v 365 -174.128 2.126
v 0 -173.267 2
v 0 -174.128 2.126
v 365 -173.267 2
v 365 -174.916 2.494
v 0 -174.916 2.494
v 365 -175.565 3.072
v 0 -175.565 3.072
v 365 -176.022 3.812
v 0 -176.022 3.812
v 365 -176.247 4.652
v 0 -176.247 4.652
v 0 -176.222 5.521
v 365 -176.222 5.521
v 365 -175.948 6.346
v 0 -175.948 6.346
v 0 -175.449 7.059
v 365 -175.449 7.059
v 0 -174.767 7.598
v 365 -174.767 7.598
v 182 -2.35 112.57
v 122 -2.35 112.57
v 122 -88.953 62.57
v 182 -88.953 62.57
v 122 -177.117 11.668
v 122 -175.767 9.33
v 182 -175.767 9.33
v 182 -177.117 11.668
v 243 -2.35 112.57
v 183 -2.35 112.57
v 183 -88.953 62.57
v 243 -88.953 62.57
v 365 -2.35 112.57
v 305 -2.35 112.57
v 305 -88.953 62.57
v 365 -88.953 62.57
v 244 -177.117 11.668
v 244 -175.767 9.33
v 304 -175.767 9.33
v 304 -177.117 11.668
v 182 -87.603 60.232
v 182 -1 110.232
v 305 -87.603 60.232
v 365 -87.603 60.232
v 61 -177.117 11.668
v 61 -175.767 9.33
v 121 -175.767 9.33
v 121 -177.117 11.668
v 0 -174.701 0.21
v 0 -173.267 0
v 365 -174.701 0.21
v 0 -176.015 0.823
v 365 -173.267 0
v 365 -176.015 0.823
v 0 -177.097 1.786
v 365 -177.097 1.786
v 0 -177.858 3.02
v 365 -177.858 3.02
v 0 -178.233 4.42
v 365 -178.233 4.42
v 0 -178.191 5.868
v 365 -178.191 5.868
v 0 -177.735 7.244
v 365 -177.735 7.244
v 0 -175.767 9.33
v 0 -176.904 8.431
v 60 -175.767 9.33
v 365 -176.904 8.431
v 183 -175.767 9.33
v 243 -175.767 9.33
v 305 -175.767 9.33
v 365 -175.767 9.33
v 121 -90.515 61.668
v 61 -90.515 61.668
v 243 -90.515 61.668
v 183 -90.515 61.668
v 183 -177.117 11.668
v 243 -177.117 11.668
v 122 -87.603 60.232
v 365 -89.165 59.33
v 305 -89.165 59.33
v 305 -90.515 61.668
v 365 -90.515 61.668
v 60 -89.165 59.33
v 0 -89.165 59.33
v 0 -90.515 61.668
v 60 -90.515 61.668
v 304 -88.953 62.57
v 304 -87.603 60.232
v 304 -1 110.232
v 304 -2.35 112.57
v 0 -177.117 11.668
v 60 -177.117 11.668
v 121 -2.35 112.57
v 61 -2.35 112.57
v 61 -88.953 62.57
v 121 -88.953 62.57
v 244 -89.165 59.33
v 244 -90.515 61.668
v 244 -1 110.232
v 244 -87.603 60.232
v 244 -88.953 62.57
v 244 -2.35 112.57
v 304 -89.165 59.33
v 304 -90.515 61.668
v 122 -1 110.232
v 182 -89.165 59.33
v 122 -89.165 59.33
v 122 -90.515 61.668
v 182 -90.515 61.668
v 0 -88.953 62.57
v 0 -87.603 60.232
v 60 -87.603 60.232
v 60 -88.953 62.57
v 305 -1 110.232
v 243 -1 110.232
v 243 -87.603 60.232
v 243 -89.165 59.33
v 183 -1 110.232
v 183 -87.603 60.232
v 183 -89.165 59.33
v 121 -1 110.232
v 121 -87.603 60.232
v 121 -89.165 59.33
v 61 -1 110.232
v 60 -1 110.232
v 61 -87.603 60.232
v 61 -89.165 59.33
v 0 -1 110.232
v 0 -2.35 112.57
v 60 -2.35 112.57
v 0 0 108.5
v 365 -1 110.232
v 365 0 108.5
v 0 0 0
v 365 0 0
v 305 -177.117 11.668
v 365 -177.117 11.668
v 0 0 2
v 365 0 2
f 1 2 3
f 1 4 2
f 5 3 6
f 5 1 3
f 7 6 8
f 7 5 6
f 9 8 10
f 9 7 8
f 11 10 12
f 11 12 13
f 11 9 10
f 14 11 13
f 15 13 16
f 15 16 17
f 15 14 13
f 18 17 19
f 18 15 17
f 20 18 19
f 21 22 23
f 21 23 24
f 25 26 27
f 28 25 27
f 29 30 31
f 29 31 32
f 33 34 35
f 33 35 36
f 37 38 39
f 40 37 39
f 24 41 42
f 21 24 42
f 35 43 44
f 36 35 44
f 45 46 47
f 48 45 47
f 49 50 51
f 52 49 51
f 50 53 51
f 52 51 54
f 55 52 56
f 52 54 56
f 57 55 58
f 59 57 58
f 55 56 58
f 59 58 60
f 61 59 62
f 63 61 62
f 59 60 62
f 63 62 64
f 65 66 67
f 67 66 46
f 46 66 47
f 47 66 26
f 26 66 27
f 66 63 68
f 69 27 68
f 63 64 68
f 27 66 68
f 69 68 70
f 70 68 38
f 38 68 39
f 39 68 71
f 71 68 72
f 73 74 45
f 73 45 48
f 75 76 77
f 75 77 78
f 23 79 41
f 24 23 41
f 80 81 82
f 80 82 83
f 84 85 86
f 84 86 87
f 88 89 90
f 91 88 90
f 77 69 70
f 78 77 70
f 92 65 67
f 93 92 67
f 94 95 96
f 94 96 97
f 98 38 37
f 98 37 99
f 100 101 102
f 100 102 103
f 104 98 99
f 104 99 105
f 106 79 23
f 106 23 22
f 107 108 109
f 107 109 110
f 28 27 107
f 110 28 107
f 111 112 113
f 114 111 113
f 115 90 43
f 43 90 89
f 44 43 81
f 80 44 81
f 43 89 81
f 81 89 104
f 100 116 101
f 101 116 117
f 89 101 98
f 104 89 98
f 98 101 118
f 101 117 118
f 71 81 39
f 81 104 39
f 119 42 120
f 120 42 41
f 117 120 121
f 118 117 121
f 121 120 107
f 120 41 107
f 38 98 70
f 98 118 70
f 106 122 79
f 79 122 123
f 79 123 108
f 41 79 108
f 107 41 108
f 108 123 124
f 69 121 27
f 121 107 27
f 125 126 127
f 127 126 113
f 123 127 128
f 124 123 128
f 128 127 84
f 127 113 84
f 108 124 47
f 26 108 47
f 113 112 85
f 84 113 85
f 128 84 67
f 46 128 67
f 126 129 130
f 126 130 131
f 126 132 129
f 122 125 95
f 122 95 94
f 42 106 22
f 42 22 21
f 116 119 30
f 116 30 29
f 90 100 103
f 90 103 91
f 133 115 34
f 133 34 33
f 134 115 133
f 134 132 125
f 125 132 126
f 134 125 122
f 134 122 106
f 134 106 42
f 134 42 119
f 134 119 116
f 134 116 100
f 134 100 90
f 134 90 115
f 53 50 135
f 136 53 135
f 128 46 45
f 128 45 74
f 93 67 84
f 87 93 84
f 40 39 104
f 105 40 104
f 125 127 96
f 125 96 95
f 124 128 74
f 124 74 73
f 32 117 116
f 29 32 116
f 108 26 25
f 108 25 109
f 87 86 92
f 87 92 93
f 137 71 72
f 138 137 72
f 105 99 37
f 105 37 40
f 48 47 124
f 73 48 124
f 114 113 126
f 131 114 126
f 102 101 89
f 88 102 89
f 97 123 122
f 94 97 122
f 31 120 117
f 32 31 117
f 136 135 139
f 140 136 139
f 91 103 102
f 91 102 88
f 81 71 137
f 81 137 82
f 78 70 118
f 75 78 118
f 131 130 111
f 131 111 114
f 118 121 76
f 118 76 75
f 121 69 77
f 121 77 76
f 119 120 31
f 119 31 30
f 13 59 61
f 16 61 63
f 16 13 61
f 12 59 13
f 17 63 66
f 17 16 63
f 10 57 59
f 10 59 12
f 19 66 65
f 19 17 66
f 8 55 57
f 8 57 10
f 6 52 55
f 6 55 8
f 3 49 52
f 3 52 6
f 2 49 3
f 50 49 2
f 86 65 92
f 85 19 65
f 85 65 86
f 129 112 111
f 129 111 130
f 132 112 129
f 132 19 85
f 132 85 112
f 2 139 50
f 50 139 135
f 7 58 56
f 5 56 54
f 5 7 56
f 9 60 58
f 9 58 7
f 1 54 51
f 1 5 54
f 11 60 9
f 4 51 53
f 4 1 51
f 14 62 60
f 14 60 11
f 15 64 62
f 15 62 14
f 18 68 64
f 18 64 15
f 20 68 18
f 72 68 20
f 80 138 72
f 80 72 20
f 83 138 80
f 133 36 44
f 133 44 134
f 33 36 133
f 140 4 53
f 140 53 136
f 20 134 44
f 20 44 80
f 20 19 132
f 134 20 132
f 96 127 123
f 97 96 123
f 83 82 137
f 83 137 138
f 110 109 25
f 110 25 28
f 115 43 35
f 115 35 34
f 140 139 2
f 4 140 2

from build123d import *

# Parameters (mm, degrees)
F1_DEPTH = 365
F2_R     = 3
F3_R     = 5
F4_W     = 60
F4_H     = 100
F5_DEPTH = 2.7


with BuildPart() as f1:
    # F0 (on Right) → F1 (new body)
    with BuildSketch(Plane.YZ):
        Polygon((0, 0), (0, 2), (-184.4634110061, 2), (0, 108.5), (-1, 110.2320508076), (-191.9275126212, 0), align=None)
    extrude(amount=F1_DEPTH)

    # F2
    f2_edges = [f1.edges().sort_by_distance(p)[0] for p in [
        (182.5, -184.463411, 2),
    ]]
    fillet(f2_edges, radius=F2_R)

    # F3
    f3_edges = [f1.edges().sort_by_distance(p)[0] for p in [
        (182.5, -191.927513, 0),
    ]]
    fillet(f3_edges, radius=F3_R)

    # F4 (on face) → F5 (join)
    with BuildSketch(Plane(origin=(0, -47.9818781553, 83.1070508076), x_dir=(1, 0, 0), z_dir=(0, -0.5, 0.8660254038))):
        with Locations((30, 4.25)):
            Rectangle(F4_W, F4_H)
        with Locations((91, 4.25)):
            Rectangle(F4_W, F4_H)
        with Locations((152, 4.25)):
            Rectangle(F4_W, F4_H)
        with Locations((213, 4.25)):
            Rectangle(F4_W, F4_H)
        with Locations((274, 4.25)):
            Rectangle(F4_W, F4_H)
        with Locations((335, 4.25)):
            Rectangle(F4_W, F4_H)
        with Locations((30, -97.5538475773)):
            Rectangle(F4_W, F4_H)
        with Locations((91, -97.5538475773)):
            Rectangle(F4_W, F4_H)
        with Locations((152, -97.5538475773)):
            Rectangle(F4_W, F4_H)
        with Locations((213, -97.5538475773)):
            Rectangle(F4_W, F4_H)
        with Locations((274, -97.5538475773)):
            Rectangle(F4_W, F4_H)
        with Locations((335, -97.5538475773)):
            Rectangle(F4_W, F4_H)
    extrude(amount=F5_DEPTH)


solid = f1.part
